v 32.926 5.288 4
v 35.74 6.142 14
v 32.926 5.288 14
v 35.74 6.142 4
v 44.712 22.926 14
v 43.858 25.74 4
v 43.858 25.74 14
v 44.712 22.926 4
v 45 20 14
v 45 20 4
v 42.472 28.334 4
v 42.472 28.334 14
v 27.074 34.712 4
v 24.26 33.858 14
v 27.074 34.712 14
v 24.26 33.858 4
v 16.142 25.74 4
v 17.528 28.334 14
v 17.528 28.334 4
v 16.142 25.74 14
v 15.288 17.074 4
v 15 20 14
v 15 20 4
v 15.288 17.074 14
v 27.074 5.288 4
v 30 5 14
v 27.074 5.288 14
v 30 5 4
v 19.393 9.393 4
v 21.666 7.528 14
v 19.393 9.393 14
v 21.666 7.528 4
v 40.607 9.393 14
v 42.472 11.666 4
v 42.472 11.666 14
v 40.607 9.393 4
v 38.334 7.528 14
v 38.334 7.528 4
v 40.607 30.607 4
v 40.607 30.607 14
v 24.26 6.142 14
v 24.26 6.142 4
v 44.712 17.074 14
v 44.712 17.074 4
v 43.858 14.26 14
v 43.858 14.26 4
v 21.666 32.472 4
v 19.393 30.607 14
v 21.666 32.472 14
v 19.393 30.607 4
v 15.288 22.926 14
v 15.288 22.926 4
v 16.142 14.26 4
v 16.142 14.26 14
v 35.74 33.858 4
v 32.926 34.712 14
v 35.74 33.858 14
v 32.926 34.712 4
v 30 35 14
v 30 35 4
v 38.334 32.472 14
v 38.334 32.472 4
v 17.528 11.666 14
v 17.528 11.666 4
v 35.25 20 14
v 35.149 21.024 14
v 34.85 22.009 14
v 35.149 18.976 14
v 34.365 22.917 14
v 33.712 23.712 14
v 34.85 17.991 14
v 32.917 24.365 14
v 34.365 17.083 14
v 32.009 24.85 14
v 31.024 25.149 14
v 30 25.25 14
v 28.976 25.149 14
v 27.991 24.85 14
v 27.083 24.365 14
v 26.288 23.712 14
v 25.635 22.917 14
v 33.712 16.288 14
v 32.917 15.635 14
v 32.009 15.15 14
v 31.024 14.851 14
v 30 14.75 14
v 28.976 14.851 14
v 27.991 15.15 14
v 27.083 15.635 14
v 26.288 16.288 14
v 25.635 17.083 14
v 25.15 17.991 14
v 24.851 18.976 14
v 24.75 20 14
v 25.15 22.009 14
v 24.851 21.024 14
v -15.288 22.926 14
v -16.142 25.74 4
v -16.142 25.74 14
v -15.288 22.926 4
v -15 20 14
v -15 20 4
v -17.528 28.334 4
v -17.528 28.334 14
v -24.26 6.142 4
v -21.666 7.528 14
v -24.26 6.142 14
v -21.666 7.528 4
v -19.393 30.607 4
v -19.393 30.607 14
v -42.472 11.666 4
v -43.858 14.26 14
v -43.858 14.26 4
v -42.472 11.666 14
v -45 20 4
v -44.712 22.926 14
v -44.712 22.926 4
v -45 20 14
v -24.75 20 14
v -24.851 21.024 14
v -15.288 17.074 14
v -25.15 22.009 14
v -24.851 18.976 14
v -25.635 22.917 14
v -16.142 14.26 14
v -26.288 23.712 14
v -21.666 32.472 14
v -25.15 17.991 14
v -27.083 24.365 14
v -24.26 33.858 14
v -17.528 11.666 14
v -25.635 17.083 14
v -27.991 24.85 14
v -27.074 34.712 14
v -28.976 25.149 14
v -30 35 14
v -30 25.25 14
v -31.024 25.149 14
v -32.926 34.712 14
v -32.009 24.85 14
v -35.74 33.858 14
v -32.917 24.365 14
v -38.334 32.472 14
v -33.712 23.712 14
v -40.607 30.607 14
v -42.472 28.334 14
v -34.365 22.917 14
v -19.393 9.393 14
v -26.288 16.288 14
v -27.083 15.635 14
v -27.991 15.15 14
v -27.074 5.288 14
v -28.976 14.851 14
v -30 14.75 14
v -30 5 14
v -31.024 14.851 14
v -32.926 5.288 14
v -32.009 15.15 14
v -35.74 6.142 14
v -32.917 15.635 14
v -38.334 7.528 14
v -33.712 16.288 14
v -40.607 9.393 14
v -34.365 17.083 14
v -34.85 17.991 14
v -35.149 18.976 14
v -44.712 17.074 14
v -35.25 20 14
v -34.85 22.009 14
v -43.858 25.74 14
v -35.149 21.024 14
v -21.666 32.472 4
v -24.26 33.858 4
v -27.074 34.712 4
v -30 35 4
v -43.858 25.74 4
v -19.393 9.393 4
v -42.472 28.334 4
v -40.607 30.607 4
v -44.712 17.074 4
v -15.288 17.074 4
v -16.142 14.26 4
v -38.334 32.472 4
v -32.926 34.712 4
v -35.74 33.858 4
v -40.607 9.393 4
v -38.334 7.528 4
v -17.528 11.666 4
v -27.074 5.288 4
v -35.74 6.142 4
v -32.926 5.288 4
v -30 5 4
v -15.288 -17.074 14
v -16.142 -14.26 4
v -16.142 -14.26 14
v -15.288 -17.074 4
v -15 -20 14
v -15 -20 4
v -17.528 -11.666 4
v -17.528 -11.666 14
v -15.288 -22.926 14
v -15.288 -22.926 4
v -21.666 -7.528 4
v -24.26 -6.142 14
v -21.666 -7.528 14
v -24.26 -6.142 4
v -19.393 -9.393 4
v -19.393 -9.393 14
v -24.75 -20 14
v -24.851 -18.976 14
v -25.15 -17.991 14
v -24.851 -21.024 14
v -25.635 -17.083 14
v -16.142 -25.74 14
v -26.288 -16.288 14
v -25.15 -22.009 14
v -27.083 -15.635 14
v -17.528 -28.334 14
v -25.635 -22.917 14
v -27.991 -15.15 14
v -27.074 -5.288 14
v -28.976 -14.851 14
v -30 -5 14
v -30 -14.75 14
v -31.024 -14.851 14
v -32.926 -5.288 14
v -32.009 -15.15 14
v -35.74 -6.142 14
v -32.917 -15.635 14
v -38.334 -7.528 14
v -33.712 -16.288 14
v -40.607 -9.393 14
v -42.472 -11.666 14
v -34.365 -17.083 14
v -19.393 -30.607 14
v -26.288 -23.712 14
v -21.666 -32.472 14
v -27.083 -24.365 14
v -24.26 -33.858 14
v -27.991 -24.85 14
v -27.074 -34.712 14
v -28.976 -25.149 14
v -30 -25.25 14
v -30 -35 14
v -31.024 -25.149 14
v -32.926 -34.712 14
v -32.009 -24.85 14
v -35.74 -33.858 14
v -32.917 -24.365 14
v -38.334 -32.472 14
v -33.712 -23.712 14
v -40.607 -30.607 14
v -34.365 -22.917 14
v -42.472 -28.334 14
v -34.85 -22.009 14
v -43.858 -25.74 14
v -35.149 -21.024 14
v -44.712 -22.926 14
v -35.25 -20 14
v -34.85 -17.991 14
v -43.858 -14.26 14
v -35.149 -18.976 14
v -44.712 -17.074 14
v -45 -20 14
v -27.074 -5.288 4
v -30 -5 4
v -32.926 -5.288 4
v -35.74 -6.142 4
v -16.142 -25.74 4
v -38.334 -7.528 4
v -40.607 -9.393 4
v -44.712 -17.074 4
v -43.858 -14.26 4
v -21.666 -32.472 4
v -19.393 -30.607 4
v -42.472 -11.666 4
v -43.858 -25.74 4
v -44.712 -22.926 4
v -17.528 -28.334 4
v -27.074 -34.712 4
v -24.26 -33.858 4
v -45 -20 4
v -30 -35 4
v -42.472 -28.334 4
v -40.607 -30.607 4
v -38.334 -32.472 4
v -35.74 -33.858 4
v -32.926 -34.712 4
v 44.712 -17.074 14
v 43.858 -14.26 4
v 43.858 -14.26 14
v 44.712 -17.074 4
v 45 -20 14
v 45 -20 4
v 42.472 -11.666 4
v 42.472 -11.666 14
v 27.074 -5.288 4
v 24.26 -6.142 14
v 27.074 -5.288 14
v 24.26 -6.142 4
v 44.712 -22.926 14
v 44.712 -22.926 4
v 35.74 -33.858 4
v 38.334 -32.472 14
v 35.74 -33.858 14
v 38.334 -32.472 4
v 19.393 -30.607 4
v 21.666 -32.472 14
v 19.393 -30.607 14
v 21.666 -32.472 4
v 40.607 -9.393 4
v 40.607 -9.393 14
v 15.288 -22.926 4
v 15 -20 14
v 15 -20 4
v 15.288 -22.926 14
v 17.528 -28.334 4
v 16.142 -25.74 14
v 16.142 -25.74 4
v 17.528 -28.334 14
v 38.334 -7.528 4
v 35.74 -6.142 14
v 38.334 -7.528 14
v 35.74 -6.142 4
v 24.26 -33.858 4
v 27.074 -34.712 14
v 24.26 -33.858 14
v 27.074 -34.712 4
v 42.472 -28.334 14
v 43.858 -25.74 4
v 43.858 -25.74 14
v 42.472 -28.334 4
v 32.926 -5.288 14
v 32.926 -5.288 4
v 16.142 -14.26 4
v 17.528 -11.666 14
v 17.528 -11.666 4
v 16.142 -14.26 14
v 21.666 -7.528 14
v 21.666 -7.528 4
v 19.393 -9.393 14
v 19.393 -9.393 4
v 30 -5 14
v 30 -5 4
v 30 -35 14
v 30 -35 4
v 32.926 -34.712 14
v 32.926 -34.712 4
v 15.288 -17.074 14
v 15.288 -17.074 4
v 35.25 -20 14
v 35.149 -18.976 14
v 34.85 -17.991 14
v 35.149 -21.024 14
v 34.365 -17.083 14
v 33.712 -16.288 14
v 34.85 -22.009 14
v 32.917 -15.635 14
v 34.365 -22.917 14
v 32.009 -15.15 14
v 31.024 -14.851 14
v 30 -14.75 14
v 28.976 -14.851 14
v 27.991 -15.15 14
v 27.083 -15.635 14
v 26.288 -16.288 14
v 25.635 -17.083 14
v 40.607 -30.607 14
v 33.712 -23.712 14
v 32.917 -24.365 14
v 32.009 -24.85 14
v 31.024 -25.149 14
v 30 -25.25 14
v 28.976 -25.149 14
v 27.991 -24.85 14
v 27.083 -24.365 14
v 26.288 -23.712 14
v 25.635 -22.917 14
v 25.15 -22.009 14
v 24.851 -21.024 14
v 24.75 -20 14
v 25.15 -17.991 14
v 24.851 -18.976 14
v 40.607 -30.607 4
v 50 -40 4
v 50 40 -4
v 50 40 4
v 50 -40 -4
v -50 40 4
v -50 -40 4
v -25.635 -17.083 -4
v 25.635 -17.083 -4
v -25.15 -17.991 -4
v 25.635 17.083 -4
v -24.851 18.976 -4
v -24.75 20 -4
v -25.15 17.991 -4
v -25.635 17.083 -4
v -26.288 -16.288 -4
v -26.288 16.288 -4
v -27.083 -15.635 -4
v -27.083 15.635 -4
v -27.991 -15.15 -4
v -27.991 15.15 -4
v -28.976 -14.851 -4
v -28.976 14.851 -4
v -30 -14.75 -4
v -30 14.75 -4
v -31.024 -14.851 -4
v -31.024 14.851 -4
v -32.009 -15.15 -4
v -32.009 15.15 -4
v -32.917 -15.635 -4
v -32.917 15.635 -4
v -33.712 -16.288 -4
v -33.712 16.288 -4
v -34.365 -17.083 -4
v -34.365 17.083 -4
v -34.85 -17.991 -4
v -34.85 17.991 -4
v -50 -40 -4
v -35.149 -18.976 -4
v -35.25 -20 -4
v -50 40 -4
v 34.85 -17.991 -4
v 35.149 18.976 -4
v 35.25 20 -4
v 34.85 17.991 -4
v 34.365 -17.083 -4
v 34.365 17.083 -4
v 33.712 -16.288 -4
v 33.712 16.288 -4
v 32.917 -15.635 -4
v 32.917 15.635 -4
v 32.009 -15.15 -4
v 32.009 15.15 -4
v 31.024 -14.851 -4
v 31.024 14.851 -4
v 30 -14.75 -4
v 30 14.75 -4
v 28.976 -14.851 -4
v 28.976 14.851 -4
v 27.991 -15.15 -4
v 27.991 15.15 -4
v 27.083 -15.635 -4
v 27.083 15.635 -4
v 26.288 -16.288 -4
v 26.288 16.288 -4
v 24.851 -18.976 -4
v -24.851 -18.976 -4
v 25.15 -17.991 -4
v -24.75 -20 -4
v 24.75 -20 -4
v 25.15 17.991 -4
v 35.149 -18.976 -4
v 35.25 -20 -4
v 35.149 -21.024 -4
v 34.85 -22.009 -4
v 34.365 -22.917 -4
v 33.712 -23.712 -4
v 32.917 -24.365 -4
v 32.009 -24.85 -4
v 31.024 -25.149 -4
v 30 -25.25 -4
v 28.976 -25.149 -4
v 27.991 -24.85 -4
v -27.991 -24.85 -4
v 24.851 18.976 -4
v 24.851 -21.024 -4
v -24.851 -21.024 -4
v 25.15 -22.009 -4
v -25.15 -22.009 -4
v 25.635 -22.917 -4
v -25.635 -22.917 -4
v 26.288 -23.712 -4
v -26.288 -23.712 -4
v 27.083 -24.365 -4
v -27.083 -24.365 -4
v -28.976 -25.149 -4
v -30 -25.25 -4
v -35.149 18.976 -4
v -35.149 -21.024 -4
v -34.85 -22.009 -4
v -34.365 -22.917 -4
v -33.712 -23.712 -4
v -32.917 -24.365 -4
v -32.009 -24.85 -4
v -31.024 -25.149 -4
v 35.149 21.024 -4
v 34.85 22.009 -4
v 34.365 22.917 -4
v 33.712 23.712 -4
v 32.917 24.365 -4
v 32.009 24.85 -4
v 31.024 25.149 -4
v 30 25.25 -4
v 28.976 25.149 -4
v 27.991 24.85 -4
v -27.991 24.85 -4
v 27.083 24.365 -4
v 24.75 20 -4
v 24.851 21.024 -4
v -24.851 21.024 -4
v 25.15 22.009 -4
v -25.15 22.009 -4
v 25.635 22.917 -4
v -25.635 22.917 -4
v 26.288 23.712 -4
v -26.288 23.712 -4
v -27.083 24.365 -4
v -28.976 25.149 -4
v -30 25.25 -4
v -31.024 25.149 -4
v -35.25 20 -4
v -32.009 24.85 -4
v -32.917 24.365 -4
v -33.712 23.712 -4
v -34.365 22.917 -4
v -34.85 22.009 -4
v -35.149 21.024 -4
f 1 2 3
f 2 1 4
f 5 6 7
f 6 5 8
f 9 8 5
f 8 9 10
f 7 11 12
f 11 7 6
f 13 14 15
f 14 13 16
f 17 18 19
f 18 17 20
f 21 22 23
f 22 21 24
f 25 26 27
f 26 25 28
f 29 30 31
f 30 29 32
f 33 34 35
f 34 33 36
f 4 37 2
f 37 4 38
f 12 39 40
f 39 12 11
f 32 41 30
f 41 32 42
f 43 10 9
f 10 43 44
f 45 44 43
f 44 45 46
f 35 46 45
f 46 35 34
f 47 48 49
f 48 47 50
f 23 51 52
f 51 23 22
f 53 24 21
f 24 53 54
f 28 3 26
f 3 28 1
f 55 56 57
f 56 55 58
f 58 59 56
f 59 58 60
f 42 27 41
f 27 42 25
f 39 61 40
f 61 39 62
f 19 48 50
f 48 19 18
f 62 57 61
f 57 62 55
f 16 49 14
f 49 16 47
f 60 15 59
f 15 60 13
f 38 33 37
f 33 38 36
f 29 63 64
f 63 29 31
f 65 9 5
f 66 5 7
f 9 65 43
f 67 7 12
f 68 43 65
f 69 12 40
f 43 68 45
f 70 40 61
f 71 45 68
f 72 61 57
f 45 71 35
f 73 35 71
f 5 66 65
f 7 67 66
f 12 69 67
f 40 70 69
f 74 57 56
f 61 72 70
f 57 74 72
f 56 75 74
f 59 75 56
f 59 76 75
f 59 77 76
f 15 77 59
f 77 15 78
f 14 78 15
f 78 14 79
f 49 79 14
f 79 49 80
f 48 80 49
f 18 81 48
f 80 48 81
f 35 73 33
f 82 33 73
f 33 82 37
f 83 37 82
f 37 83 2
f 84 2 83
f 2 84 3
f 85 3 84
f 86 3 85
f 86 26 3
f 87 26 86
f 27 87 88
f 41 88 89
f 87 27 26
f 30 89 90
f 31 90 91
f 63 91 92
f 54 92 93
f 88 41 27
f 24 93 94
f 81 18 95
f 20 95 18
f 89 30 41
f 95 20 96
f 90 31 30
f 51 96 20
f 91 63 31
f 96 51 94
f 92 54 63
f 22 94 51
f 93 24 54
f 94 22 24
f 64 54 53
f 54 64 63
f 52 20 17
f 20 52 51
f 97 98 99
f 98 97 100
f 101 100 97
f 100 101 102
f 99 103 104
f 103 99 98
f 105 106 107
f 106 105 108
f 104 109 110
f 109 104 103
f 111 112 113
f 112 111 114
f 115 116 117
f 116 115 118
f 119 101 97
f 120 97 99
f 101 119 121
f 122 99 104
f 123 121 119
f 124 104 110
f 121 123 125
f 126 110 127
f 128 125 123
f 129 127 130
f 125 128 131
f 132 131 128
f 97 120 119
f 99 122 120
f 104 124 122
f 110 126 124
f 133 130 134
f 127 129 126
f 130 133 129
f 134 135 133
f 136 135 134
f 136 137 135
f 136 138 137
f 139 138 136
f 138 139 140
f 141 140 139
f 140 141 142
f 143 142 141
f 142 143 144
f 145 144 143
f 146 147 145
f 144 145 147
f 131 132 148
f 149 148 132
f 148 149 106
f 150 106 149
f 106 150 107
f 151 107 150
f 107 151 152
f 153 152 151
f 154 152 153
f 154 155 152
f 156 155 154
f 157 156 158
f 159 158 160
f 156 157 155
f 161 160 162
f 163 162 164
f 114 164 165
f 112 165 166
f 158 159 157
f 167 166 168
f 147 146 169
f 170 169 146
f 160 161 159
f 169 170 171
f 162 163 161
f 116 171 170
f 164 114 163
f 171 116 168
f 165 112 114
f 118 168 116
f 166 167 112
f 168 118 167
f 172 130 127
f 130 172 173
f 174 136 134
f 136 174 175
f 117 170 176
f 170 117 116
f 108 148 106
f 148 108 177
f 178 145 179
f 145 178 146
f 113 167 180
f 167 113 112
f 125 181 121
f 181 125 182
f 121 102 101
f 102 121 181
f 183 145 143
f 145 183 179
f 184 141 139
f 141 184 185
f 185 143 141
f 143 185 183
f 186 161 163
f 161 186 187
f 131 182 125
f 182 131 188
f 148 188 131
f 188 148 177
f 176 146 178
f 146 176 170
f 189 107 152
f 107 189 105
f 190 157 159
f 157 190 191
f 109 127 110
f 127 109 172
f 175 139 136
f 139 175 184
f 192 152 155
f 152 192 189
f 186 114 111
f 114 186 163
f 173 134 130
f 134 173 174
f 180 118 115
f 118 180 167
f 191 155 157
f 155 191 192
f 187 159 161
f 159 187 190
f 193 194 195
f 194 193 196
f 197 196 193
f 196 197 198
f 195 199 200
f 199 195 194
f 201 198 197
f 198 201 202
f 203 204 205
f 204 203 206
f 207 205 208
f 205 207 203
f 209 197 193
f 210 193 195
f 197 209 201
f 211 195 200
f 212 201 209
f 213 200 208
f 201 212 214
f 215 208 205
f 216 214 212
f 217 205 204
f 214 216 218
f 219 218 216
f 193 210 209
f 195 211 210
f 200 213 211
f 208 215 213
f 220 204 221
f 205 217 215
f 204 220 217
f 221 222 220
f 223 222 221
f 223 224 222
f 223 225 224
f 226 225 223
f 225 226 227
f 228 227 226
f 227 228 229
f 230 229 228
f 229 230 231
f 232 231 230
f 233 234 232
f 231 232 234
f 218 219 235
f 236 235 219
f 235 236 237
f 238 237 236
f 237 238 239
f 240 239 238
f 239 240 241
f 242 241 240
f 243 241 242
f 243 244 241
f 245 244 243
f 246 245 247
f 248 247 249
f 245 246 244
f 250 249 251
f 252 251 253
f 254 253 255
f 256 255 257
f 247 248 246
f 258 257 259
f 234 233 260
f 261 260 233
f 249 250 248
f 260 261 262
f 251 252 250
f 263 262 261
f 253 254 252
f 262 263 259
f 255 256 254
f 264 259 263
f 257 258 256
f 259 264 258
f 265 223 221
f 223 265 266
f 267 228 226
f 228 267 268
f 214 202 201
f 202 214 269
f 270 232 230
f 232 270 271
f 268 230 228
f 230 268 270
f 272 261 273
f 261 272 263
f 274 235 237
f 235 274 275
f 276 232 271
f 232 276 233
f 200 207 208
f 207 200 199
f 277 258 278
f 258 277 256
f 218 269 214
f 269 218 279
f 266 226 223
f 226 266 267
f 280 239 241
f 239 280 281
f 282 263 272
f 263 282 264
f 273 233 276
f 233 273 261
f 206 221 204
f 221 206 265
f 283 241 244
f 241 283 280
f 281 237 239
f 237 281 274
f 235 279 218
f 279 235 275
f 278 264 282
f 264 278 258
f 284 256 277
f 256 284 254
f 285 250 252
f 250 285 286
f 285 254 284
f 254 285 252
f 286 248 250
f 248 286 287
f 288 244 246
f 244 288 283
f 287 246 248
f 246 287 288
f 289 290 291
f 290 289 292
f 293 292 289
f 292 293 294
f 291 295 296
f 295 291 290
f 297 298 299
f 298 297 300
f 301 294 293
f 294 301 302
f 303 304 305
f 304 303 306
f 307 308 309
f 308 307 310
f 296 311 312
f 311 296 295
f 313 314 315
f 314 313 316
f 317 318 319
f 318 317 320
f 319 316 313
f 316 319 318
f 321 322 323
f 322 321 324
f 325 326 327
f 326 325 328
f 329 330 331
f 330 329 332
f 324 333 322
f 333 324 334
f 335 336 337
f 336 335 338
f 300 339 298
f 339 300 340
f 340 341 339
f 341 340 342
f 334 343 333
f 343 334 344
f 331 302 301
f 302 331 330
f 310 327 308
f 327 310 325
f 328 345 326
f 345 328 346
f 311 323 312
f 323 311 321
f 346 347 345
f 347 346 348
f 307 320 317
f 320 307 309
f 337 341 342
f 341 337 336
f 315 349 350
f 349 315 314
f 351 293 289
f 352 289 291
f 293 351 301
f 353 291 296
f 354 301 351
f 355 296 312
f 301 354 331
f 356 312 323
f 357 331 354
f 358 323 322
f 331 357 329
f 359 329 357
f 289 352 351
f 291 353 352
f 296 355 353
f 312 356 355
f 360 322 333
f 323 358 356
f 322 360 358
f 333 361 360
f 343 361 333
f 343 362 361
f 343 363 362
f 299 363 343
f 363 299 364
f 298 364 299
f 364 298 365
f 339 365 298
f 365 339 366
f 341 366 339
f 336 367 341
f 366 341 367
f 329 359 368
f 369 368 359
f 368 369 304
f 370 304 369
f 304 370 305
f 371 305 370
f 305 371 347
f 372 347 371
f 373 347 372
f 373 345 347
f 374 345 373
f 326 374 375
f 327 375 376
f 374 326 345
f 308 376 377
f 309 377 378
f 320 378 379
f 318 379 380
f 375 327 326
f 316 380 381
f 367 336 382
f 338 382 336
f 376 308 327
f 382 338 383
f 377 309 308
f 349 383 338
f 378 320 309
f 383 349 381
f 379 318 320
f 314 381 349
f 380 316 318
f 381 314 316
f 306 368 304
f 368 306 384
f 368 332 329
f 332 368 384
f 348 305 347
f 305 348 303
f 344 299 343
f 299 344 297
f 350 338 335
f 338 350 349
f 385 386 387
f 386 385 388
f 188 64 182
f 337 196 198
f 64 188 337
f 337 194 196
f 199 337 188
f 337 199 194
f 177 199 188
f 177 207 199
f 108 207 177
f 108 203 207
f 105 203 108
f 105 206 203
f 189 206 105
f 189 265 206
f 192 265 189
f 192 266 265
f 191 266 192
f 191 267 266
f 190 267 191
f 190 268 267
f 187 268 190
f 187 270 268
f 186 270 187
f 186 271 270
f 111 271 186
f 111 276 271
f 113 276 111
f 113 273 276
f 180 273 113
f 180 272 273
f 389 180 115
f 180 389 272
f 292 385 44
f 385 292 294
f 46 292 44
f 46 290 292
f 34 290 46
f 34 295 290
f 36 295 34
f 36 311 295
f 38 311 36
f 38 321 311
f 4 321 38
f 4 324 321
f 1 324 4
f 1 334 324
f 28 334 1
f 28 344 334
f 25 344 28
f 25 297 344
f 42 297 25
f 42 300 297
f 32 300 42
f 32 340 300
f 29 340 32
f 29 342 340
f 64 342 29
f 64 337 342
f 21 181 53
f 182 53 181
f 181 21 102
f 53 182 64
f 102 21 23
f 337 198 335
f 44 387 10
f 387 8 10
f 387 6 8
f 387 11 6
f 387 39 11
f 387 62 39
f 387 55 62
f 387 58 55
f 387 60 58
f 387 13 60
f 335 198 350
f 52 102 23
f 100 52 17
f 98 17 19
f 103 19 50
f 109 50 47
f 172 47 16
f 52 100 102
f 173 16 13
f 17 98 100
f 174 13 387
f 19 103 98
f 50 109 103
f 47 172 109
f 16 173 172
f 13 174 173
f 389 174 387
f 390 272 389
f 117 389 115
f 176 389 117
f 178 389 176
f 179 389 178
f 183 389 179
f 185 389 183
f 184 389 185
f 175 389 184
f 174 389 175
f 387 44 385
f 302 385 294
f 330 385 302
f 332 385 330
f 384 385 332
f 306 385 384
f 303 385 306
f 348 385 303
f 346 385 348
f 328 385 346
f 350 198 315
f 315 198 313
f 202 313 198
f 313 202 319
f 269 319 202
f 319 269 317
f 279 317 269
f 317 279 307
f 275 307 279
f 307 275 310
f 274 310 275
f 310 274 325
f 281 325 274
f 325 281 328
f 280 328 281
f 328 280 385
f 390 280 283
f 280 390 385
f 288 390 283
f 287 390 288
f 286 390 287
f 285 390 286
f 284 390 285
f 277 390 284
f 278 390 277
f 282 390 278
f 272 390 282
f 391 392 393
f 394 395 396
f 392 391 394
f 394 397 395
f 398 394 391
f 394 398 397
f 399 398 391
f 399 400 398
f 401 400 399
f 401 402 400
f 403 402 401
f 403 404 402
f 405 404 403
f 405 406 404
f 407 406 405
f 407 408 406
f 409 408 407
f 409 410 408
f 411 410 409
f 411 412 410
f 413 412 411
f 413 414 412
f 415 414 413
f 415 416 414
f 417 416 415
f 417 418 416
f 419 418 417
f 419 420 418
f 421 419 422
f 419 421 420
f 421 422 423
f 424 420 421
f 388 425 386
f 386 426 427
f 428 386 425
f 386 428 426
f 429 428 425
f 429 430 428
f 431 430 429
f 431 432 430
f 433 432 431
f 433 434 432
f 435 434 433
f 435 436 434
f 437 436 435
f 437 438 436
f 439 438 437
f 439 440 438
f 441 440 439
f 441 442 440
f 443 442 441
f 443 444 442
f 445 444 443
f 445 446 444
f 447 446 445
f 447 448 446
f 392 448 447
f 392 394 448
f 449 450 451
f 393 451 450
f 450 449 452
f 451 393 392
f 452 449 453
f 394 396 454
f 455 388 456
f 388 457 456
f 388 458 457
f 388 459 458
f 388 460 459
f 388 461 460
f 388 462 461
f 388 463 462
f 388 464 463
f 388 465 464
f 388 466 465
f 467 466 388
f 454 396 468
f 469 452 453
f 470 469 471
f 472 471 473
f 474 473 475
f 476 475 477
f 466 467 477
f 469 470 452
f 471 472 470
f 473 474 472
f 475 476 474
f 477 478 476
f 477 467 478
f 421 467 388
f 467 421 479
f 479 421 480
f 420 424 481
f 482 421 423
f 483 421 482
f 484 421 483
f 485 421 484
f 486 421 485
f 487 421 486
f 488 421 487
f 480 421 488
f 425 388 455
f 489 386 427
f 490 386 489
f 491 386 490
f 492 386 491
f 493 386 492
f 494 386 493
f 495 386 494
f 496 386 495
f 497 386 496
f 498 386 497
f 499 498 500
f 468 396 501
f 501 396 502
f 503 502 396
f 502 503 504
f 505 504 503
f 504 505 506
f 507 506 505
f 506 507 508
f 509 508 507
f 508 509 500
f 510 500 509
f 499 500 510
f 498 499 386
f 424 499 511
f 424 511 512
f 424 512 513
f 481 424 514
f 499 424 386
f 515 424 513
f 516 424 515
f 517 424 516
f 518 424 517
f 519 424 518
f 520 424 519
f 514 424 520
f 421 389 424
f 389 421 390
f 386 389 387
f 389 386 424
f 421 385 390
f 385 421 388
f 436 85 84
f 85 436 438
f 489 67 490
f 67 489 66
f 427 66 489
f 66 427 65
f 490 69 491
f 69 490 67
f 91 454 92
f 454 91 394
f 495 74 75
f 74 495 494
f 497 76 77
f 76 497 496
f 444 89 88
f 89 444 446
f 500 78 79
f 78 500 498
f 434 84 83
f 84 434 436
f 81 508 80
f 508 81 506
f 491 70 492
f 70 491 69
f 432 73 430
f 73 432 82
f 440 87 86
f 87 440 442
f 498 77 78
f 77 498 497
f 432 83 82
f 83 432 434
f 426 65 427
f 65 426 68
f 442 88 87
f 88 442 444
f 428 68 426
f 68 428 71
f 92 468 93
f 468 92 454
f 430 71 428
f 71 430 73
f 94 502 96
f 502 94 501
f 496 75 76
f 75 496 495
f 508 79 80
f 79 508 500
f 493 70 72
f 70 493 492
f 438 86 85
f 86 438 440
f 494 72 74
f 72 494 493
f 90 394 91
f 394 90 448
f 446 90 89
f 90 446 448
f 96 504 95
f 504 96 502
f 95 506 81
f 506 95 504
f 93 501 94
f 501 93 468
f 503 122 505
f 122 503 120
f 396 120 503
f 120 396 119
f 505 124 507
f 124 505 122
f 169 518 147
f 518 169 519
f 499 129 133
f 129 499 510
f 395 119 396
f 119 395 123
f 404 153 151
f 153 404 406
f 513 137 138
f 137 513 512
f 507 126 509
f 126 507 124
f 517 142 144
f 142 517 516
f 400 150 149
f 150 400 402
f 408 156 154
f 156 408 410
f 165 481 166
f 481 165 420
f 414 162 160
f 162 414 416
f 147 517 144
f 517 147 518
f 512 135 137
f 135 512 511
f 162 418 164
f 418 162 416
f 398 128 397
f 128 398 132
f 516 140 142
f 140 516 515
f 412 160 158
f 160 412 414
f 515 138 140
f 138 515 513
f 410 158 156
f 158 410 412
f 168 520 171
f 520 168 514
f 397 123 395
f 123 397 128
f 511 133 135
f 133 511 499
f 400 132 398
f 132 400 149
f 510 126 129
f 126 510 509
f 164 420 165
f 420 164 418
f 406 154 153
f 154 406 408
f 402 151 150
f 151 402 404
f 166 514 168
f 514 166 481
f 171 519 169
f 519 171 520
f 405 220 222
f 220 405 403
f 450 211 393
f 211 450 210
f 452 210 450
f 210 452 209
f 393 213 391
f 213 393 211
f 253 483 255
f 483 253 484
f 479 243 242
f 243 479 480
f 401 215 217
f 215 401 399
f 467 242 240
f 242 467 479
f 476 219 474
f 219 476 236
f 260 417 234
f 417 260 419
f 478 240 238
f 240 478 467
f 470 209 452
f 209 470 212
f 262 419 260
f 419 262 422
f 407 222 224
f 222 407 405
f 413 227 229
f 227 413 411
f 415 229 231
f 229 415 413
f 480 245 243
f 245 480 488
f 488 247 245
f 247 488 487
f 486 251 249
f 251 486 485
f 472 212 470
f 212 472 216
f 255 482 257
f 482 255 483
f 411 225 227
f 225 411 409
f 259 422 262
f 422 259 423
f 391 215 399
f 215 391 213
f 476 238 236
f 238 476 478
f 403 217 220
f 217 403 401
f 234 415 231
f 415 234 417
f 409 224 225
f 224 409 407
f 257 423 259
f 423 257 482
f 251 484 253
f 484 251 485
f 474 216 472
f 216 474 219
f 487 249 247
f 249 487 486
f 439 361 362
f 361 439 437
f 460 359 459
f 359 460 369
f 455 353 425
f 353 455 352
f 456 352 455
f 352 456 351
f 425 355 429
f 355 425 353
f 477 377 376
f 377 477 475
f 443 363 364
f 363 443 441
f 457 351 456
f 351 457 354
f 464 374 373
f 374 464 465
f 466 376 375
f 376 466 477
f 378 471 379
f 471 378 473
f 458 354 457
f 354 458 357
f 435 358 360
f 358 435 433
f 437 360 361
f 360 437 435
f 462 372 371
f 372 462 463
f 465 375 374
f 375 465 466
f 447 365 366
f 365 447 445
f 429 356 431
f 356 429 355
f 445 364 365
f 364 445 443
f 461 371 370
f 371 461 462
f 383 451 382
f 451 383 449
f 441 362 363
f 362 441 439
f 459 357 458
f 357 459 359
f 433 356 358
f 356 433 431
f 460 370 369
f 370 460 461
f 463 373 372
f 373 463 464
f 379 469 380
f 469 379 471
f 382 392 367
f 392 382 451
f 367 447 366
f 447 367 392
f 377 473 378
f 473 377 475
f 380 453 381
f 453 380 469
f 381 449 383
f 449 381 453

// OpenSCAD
$fn = 32;

// ----------------------------------------------------------------------
// Anchor pads 100 x 80 x 18
// four corner bosses with anchor holes
// ----------------------------------------------------------------------

// --- parameters (mm) ---
plate = [100, 80, 8];  // base plate size (x, y, z)
pads = 4;              // boss count, one per corner
edge = 20;             // boss centre offset from the plate edge
boss_d = 30;           // boss diameter
boss_h = 10;           // boss height above the base plate
hole_d = 10.5;         // hole diameter

// --- derived feature positions (mm) ---
height = plate[2] + boss_h;      // = 18   overall height of the part
corner_x = plate[0] / 2 - edge;  // = 30   boss centre X
corner_y = plate[1] / 2 - edge;  // = 20   boss centre Y
feature_centers = [
  [corner_x, corner_y],
  [-corner_x, corner_y],
  [-corner_x, -corner_y],
  [corner_x, -corner_y]
];   // boss centres, anchor holes are drilled there

// base plate, four bosses standing on it, anchor holes all the way through
difference() {
  union() {
    cube(plate, center = true);
    for (centre = feature_centers)
      translate([centre[0], centre[1], plate[2] / 2 - 1])
        cylinder(d = boss_d, h = boss_h + 1);
  }
  for (centre = feature_centers)
    translate([centre[0], centre[1], -height])
      cylinder(d = hole_d, h = 2 * height + 2);  // through boss and plate
}
